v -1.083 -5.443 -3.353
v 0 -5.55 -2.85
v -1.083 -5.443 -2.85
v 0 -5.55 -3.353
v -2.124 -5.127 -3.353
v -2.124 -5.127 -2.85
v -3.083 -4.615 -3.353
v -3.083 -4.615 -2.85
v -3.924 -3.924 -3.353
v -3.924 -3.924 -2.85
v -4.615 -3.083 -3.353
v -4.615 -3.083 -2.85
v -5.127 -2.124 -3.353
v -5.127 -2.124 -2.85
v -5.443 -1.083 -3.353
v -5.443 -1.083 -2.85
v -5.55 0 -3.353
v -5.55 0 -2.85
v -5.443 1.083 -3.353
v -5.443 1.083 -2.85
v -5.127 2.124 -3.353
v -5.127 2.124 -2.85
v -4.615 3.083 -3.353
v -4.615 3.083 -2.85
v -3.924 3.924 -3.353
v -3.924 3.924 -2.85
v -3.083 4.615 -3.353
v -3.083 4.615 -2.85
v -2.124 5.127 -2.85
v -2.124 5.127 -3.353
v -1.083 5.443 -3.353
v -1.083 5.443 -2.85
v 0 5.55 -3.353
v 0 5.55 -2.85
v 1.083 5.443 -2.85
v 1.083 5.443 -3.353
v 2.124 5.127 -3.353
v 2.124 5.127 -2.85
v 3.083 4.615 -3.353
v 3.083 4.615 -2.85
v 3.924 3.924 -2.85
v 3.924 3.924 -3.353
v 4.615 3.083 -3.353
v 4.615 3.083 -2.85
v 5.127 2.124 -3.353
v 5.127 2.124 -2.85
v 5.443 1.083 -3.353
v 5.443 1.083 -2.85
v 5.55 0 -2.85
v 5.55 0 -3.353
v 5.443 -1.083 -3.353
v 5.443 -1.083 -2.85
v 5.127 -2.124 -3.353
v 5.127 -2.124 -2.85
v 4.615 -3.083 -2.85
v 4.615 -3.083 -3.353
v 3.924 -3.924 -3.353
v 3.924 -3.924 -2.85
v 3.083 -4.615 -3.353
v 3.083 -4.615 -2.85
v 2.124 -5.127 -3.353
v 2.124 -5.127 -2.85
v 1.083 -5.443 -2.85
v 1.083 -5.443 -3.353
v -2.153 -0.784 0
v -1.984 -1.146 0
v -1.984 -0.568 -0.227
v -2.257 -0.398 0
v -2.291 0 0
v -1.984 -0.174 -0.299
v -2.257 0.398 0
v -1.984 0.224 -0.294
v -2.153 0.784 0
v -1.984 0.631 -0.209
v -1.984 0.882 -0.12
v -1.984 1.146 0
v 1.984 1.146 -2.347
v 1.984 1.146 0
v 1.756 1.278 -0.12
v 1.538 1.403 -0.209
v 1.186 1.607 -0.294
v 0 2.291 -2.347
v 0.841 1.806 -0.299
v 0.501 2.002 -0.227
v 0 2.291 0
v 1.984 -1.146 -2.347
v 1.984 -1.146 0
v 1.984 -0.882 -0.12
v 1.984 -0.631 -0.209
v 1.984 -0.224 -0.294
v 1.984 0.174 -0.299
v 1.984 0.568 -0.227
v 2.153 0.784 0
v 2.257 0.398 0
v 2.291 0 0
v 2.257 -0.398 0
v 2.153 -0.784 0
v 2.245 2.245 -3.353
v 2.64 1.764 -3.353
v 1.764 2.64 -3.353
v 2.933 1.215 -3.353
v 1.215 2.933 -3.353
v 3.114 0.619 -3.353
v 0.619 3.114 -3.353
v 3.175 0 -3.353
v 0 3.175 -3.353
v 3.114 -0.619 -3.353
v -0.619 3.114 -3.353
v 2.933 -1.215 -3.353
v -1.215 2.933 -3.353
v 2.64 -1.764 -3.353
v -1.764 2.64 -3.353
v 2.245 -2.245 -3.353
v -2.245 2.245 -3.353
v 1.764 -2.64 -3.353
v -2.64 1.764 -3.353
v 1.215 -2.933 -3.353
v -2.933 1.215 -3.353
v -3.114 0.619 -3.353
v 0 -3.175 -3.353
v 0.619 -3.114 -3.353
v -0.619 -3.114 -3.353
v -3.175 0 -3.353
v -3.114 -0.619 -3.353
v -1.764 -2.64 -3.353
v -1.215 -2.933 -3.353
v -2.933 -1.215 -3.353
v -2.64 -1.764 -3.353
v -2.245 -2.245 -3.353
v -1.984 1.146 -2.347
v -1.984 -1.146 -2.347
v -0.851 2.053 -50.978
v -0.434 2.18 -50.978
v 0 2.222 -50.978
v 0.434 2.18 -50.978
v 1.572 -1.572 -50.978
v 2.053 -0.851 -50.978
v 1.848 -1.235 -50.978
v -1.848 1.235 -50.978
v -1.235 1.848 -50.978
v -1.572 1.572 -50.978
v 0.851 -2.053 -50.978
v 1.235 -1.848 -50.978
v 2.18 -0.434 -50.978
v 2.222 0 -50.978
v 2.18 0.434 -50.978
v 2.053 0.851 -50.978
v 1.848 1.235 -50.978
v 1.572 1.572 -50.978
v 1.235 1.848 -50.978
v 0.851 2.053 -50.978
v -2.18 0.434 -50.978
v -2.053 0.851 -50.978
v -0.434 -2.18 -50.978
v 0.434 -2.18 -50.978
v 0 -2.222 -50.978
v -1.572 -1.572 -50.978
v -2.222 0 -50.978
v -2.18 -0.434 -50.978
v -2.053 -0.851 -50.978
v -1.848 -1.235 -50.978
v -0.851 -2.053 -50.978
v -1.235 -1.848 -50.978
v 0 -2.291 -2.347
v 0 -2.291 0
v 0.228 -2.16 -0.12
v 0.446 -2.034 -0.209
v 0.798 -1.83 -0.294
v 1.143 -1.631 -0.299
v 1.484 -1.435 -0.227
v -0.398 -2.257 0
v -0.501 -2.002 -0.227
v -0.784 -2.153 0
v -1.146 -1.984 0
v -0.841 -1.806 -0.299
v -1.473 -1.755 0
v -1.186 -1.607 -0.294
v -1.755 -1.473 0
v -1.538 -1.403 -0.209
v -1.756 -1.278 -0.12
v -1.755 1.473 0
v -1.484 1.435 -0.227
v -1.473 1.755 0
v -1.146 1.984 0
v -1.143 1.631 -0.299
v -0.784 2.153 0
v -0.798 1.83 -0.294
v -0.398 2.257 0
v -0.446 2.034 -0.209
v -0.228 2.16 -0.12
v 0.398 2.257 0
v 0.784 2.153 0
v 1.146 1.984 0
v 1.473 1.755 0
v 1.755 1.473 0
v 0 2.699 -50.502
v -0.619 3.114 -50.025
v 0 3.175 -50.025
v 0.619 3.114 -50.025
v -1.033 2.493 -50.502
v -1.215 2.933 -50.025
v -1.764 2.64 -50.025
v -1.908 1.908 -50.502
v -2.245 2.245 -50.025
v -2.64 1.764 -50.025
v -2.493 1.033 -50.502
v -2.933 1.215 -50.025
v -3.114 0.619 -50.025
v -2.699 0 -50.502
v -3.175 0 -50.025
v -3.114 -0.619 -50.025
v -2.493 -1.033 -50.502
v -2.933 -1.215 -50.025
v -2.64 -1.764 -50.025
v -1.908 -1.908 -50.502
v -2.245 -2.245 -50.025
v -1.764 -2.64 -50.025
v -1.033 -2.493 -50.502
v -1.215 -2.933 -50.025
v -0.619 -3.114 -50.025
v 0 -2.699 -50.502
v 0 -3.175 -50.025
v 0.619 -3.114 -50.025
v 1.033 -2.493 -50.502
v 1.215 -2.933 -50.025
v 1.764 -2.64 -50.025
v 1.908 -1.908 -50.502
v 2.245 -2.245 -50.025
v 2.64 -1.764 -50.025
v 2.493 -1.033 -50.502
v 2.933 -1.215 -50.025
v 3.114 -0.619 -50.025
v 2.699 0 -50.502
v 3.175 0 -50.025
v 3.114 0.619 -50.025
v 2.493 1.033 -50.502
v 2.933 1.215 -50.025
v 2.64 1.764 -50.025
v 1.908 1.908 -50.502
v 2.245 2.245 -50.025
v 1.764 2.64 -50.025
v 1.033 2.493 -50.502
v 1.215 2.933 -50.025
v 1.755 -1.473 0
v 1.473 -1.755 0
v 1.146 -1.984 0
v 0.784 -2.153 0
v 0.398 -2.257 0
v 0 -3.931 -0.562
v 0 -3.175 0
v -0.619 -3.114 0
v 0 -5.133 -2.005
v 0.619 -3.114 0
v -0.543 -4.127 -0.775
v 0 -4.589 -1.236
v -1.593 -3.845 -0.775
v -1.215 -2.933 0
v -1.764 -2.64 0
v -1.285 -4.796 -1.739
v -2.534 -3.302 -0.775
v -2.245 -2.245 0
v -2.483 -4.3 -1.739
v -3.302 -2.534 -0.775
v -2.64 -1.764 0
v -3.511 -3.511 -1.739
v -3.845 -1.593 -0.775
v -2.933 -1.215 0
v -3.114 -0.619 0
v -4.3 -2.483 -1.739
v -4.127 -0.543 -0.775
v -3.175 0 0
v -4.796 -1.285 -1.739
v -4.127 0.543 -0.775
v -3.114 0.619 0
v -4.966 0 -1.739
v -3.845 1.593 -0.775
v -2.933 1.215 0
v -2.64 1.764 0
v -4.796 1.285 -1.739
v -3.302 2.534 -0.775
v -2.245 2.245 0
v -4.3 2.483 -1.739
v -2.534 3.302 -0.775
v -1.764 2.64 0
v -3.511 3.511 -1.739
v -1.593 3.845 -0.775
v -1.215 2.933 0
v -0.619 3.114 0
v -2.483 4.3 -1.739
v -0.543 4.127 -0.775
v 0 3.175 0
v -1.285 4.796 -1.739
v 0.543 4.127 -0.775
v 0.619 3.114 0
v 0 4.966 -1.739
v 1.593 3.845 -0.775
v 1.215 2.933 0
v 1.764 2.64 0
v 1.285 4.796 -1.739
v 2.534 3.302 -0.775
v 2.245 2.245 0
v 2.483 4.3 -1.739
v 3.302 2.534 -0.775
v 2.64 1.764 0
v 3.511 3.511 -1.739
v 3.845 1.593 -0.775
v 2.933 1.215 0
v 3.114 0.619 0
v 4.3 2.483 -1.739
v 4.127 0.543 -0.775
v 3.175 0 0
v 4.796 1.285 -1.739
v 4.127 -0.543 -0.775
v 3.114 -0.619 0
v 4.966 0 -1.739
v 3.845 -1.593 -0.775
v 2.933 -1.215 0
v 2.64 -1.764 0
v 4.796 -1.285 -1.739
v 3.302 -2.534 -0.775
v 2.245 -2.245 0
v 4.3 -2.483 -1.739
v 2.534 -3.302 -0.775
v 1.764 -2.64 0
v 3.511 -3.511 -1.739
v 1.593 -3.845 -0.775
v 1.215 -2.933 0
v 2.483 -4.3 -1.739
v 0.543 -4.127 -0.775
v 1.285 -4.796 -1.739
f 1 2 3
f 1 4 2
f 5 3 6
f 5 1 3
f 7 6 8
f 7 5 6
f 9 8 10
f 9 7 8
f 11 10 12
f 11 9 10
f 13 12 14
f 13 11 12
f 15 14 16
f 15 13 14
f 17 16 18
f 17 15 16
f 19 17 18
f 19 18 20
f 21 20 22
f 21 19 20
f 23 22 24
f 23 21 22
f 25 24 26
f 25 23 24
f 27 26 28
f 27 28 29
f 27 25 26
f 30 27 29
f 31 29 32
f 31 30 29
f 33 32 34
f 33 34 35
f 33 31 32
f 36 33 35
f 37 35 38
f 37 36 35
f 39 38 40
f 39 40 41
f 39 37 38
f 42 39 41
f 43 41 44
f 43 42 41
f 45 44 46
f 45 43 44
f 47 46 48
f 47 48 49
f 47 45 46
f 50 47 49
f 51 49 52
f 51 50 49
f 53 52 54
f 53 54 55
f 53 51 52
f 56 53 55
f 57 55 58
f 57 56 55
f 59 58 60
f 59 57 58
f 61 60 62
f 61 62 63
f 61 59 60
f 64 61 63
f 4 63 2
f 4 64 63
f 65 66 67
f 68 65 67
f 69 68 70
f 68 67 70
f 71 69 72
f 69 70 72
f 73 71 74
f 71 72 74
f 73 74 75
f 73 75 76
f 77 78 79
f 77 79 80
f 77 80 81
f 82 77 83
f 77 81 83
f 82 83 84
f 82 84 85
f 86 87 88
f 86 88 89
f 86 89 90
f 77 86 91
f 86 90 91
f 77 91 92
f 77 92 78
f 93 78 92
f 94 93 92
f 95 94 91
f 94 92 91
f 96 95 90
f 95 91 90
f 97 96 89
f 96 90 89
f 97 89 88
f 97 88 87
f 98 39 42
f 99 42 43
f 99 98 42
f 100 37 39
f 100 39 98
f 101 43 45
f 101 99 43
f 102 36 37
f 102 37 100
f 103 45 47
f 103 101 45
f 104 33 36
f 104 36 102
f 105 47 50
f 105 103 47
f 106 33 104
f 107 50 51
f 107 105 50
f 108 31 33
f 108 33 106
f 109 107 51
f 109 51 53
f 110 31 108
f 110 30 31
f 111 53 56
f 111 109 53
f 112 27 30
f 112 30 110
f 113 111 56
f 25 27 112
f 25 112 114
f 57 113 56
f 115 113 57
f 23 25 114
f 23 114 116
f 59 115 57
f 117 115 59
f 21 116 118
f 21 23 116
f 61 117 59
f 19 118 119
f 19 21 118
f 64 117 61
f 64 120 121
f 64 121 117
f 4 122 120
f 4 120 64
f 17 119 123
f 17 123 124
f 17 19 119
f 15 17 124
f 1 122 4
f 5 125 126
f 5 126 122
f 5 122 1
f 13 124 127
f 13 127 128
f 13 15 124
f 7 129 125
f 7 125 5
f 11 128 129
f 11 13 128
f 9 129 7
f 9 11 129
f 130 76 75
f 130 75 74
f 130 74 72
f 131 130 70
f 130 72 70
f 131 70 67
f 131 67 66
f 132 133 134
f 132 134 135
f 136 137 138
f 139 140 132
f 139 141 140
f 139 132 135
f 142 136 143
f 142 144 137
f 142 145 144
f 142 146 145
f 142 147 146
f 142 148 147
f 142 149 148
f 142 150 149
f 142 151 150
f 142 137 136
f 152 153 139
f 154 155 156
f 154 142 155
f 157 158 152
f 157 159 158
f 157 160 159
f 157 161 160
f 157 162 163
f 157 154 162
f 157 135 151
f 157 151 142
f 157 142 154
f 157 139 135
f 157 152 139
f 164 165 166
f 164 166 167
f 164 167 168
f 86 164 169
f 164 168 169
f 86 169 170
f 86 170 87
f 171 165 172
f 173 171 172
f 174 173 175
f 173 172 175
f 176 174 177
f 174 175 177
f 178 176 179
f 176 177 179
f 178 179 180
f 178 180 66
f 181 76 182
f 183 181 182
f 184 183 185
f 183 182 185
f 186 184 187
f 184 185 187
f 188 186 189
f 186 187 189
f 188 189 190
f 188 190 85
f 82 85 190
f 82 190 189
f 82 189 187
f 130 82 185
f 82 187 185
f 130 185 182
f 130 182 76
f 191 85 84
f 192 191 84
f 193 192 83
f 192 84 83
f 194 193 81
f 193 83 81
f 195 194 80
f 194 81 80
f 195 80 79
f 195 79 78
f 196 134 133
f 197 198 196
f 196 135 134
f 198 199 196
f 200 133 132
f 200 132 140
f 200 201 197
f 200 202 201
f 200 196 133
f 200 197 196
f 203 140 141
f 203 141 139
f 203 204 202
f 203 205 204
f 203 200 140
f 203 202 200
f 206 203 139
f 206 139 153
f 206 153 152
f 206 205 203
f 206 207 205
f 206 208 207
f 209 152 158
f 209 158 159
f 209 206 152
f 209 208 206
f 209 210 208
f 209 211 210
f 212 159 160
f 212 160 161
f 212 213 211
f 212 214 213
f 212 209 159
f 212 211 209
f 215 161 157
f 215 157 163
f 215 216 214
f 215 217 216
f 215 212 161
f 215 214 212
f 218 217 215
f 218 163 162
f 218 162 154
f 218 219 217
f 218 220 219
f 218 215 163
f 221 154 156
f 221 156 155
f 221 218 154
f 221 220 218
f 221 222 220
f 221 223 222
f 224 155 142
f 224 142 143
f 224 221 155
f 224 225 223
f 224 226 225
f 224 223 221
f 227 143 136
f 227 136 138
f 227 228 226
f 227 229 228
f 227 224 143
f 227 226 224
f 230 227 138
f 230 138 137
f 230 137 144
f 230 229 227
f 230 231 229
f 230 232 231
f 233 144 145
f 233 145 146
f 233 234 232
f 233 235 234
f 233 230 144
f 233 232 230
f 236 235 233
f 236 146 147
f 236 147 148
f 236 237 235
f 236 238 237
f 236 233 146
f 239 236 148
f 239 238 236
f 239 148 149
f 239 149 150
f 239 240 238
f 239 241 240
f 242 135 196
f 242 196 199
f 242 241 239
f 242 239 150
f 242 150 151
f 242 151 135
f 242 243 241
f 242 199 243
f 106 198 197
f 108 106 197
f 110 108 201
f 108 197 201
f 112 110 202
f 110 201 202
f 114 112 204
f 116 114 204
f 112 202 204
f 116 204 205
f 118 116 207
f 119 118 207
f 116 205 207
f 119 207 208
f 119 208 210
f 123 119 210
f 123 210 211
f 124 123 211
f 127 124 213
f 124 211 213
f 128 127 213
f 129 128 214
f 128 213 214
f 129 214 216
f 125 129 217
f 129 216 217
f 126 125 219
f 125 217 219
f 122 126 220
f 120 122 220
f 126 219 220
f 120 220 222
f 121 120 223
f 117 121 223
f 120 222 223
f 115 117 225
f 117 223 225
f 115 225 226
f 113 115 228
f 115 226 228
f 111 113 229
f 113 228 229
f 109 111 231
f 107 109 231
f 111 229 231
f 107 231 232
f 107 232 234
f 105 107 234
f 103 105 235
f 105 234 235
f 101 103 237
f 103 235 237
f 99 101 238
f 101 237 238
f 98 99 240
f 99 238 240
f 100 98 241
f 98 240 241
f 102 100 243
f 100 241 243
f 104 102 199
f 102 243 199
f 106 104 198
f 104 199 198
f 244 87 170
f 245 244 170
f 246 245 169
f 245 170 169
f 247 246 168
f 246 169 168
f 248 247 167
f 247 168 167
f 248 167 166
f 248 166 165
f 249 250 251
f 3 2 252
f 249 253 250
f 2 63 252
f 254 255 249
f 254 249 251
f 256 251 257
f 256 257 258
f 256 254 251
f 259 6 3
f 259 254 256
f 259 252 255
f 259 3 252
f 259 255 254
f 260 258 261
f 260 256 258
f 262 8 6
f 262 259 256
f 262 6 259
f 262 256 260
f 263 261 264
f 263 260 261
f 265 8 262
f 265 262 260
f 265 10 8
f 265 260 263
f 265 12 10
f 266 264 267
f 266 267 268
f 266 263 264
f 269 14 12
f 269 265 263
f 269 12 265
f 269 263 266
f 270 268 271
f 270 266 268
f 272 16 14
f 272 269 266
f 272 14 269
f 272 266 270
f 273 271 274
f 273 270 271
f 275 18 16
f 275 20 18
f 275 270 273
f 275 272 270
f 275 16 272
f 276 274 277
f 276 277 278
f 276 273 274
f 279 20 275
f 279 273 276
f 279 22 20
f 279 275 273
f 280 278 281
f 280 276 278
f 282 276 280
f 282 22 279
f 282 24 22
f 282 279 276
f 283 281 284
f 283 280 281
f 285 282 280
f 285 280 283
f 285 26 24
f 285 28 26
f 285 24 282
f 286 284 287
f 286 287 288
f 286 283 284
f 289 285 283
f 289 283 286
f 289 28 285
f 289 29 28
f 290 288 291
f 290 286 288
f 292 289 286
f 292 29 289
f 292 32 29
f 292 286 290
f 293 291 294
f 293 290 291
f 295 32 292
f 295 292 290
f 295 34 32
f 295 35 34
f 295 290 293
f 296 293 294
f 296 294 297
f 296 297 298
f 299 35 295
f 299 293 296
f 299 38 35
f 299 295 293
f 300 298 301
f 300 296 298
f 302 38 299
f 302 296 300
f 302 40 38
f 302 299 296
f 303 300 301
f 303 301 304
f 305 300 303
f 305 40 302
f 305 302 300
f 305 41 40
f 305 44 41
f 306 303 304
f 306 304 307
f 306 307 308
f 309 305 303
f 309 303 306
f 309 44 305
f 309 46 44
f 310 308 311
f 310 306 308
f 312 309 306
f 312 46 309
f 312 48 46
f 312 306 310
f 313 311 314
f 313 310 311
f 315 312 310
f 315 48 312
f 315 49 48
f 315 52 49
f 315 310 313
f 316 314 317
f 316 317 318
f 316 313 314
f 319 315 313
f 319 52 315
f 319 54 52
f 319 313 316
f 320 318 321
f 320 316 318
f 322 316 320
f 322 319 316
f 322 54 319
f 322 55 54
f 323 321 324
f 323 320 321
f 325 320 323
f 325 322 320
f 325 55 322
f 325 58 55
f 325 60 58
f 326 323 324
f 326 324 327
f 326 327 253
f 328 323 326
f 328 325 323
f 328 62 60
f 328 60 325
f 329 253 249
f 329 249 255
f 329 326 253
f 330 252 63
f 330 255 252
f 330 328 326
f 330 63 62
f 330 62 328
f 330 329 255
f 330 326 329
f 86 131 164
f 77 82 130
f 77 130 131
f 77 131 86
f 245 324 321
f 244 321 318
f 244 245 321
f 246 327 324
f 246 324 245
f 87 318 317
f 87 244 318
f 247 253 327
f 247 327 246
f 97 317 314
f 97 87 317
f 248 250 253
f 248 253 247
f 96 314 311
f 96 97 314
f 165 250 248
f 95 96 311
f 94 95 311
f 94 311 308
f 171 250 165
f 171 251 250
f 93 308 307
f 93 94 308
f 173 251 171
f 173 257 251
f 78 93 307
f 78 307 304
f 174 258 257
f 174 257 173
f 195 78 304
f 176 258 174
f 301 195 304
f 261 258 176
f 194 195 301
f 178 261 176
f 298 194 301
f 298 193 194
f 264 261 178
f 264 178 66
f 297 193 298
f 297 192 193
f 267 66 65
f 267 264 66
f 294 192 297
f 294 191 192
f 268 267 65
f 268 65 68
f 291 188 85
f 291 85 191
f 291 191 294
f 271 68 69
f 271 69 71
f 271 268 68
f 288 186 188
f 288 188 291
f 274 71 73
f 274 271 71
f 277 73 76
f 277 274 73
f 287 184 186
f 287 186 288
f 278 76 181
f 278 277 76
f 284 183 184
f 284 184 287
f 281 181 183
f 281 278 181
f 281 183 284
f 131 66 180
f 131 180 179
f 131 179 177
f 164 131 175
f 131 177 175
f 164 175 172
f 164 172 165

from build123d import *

# Parameters (mm, degrees)
SKETCH1_W          = 47.625
SKETCH1_H          = 3.175
CHAMFER1_SIZE      = 0.9525
CUT_EXTRUDE2_DEPTH = 2.34696


with BuildPart() as part:
    # Sketch1 → Revolve1 (revolve)
    with BuildSketch(Plane(origin=(0, 0, 0), x_dir=(0, 0, -1), z_dir=(1, 0, 0))):
        with Locations((27.1653, 1.5875)):
            Rectangle(SKETCH1_W, SKETCH1_H)
    revolve(axis=Axis((0, 0, -50.9778), (0, 0, 1)))

    # Chamfer1
    chamfer1_edges = [part.edges().sort_by_distance(p)[0] for p in [
        (0, -3.175, -50.9778),
    ]]
    chamfer(chamfer1_edges, length=CHAMFER1_SIZE)

    # Sketch7 → Revolve2 (revolve)
    with BuildSketch(Plane(origin=(0, 0, 0), x_dir=(0, 0, -1), z_dir=(1, 0, 0))):
        with BuildLine():
            Line((2.84988, 5.5499), (3.3528, 5.5499))
            Line((3.3528, 5.5499), (3.3528, 0))
            Line((3.3528, 0), (0, 0))
            Line((0, 0), (0, 3.175))
            ThreePointArc((0, 3.175), (1.235921075, 4.58927271), (2.84988, 5.5499))
        make_face()
    revolve(axis=Axis((0, 0, 0), (0, 0, -1)))

    # Sketch5 → Cut-Extrude2 (cut)
    with BuildSketch(Plane.XY):
        Polygon((1.984375, -1.14567944), (1.984375, 1.14567944), (0, 2.291358881), (-1.984375, 1.14567944), (-1.984375, -1.14567944), (0, -2.291358881), align=None)
    extrude(amount=-CUT_EXTRUDE2_DEPTH, mode=Mode.SUBTRACT)

    # Cut-Extrude3 cone 1 section (through the dimple's axis) → Cut-Extrude3 (revolve, cut)
    with BuildSketch(Plane(origin=(0, 0, 0), x_dir=(0, -1, 0), z_dir=(1, 0, 0))):
        Polygon((0, 0), (2.291358881, 0), (0, 2.291358881), align=None)
    revolve(axis=Axis((0, 0, 0), (0, 0, -1)), mode=Mode.SUBTRACT)


solid = part.part
